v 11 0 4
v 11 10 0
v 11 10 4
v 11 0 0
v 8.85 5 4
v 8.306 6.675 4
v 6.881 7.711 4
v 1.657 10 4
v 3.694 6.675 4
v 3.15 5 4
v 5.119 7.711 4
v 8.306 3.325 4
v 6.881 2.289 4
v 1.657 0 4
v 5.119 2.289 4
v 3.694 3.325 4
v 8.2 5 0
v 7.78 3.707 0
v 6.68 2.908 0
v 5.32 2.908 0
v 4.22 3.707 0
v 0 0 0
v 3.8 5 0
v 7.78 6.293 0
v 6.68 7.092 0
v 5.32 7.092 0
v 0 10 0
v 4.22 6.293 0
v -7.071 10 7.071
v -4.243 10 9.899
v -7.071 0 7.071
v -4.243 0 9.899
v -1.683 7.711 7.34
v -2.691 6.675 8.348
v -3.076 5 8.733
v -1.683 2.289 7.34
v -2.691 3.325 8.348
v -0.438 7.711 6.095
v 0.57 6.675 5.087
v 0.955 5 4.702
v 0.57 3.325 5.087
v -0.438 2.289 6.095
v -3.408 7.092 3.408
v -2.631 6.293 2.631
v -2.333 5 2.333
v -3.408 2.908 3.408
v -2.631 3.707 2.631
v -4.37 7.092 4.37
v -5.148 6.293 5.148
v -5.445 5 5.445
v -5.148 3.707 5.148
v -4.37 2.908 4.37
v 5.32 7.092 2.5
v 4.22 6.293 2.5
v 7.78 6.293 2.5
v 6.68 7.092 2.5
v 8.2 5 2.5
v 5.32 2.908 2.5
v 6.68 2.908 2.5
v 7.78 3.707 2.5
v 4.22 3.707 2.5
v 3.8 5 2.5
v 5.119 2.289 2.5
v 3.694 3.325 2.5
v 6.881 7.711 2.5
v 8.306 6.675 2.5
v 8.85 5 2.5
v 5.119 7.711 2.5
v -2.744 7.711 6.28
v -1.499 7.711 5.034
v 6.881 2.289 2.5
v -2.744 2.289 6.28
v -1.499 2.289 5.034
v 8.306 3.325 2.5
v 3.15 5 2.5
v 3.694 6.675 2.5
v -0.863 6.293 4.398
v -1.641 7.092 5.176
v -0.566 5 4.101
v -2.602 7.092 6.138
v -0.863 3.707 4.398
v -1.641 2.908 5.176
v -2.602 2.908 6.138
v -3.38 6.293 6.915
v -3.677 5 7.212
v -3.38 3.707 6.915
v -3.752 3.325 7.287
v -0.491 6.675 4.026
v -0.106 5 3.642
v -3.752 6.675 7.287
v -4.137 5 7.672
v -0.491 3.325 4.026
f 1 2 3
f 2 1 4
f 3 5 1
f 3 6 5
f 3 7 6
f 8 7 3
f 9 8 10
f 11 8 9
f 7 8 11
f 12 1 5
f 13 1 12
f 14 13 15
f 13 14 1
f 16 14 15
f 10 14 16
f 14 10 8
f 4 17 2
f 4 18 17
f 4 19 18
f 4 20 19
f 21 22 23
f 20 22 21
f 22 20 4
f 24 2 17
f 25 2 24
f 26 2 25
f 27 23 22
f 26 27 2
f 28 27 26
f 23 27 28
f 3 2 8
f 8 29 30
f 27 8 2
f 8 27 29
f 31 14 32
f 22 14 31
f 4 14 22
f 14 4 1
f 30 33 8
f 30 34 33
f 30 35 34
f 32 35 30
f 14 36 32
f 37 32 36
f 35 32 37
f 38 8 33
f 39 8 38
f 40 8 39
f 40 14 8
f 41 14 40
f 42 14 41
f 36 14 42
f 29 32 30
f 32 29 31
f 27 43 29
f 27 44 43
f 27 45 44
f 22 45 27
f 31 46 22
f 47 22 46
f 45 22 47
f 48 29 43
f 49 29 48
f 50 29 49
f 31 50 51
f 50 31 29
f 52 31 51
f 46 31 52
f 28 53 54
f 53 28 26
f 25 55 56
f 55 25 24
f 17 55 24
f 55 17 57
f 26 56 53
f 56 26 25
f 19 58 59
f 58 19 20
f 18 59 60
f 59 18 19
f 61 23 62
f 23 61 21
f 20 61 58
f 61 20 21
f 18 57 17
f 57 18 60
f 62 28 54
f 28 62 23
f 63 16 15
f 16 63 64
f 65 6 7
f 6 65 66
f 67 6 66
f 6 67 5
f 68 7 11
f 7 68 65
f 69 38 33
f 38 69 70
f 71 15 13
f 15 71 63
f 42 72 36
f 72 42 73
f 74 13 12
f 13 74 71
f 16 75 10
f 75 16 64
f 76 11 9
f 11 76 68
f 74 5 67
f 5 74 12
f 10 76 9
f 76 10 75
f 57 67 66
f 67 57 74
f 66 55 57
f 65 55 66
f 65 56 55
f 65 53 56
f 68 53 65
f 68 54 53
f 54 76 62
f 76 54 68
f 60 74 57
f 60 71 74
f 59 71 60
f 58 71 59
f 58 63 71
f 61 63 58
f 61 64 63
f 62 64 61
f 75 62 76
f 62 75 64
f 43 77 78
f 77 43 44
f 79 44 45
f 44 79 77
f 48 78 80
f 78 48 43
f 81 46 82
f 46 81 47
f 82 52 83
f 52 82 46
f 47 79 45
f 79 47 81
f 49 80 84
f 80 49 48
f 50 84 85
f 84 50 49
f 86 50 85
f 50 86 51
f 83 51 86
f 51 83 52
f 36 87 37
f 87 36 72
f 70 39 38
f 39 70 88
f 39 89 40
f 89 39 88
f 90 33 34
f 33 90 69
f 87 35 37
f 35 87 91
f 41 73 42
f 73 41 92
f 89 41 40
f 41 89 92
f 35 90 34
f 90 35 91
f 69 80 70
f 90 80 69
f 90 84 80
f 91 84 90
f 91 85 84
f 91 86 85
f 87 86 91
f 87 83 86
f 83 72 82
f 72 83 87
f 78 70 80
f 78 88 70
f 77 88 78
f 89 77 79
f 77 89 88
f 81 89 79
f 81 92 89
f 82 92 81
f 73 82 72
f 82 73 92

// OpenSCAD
// PRUSA iteration3
// Fan mount
// GNU GPL v3
// Josef Průša <iam@josefprusa.cz> and contributors
// http://www.reprap.org/wiki/Prusa_Mendel
// http://prusamendel.org

module fan_mount_base(){
 translate([0,0,0]) rotate([0,0,0]) cube([11,10, 4]);
 translate([0,0,0]) rotate([0,45,0]) translate([-10,0,0]) cube([10,10, 4]);
}

module fan_mount_holes(){
 translate([6,5,-1]) rotate([0,0,0]) cylinder(h=30, r=2.2, $fn=10);
 translate([6,5,2.5]) rotate([0,0,0]) cylinder(h=30, r=5.7/2, $fn=10);

 translate([0,5,0]) rotate([0,45,0]) translate([-5.5,0,-1]) cylinder(h=30, r=2.2, $fn=10);
 translate([0,5,0]) rotate([0,45,0]) translate([-5.5,0,2.5]) cylinder(h=30, r=5.7/2, $fn=10);
}

// Final part
module fan_mount(){
 difference(){
  fan_mount_base();
  fan_mount_holes();
 }
}

fan_mount();
